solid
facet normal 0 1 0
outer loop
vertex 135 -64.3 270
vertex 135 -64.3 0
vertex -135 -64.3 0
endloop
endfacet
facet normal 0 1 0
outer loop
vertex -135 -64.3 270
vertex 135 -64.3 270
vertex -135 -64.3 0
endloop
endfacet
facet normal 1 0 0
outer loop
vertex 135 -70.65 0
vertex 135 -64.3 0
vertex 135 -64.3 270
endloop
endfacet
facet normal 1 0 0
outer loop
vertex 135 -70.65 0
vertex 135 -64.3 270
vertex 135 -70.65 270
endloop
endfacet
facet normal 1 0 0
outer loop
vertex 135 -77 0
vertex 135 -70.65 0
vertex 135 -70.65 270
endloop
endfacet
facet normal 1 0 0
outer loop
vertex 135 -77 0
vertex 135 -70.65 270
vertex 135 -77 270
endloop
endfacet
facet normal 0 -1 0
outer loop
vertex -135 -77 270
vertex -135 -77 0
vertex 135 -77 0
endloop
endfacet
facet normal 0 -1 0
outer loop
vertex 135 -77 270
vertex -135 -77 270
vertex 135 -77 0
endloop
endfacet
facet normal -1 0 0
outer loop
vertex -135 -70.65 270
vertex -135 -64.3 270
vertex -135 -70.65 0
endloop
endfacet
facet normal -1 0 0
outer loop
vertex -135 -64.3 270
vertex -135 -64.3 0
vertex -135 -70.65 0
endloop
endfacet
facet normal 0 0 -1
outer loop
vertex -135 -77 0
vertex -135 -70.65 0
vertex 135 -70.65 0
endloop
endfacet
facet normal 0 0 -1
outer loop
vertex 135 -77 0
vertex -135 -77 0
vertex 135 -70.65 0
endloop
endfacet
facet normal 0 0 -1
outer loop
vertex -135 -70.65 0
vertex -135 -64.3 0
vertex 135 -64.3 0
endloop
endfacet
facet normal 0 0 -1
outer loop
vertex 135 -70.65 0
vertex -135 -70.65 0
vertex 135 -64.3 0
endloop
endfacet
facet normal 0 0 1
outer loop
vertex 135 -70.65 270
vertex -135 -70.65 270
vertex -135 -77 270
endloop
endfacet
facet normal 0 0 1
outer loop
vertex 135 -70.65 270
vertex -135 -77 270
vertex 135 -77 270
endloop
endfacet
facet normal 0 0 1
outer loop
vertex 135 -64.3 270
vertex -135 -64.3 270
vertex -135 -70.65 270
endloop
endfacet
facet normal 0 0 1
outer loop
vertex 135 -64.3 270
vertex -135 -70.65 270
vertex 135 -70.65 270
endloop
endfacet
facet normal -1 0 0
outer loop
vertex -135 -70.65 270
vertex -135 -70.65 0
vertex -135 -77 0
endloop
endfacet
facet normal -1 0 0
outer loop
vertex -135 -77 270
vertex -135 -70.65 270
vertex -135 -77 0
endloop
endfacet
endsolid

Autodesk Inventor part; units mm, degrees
ref_plane "YZ Plane" through (0, 0, 0) normal (1, 0, 0) x (0, 1, 0)
ref_plane "XZ Plane" through (0, 0, 0) normal (0, 1, 0) x (-1, 0, 0)
ref_plane "XY Plane" through (0, 0, 0) normal (0, 0, 1) x (1, 0, 0)
sketch "Sketch1" plane through (0, 0, 0) normal (0, 0, 1) x (1, 0, 0)
  line L0 (135, 77) -> (135, -77) projected
  line L1 (-135, -77) -> (135, -77)
  line L2 (135, -77) -> (135, -70.65)
  line L3 (-135, -70.65) -> (-135, -77)
  line L4 (-135, -77) -> (135, -77)
  line L5 (135, -77) -> (135, -64.3)
  line L6 (135, -64.3) -> (-135, -64.3)
  line L7 (-135, -64.3) -> (-135, -77)
  point P0 (0, 0)
  point P1 (-135, -7)
extrude "Extrusion1" add sketch "Sketch1" along normal blind 270
properties part number "Bottom"
